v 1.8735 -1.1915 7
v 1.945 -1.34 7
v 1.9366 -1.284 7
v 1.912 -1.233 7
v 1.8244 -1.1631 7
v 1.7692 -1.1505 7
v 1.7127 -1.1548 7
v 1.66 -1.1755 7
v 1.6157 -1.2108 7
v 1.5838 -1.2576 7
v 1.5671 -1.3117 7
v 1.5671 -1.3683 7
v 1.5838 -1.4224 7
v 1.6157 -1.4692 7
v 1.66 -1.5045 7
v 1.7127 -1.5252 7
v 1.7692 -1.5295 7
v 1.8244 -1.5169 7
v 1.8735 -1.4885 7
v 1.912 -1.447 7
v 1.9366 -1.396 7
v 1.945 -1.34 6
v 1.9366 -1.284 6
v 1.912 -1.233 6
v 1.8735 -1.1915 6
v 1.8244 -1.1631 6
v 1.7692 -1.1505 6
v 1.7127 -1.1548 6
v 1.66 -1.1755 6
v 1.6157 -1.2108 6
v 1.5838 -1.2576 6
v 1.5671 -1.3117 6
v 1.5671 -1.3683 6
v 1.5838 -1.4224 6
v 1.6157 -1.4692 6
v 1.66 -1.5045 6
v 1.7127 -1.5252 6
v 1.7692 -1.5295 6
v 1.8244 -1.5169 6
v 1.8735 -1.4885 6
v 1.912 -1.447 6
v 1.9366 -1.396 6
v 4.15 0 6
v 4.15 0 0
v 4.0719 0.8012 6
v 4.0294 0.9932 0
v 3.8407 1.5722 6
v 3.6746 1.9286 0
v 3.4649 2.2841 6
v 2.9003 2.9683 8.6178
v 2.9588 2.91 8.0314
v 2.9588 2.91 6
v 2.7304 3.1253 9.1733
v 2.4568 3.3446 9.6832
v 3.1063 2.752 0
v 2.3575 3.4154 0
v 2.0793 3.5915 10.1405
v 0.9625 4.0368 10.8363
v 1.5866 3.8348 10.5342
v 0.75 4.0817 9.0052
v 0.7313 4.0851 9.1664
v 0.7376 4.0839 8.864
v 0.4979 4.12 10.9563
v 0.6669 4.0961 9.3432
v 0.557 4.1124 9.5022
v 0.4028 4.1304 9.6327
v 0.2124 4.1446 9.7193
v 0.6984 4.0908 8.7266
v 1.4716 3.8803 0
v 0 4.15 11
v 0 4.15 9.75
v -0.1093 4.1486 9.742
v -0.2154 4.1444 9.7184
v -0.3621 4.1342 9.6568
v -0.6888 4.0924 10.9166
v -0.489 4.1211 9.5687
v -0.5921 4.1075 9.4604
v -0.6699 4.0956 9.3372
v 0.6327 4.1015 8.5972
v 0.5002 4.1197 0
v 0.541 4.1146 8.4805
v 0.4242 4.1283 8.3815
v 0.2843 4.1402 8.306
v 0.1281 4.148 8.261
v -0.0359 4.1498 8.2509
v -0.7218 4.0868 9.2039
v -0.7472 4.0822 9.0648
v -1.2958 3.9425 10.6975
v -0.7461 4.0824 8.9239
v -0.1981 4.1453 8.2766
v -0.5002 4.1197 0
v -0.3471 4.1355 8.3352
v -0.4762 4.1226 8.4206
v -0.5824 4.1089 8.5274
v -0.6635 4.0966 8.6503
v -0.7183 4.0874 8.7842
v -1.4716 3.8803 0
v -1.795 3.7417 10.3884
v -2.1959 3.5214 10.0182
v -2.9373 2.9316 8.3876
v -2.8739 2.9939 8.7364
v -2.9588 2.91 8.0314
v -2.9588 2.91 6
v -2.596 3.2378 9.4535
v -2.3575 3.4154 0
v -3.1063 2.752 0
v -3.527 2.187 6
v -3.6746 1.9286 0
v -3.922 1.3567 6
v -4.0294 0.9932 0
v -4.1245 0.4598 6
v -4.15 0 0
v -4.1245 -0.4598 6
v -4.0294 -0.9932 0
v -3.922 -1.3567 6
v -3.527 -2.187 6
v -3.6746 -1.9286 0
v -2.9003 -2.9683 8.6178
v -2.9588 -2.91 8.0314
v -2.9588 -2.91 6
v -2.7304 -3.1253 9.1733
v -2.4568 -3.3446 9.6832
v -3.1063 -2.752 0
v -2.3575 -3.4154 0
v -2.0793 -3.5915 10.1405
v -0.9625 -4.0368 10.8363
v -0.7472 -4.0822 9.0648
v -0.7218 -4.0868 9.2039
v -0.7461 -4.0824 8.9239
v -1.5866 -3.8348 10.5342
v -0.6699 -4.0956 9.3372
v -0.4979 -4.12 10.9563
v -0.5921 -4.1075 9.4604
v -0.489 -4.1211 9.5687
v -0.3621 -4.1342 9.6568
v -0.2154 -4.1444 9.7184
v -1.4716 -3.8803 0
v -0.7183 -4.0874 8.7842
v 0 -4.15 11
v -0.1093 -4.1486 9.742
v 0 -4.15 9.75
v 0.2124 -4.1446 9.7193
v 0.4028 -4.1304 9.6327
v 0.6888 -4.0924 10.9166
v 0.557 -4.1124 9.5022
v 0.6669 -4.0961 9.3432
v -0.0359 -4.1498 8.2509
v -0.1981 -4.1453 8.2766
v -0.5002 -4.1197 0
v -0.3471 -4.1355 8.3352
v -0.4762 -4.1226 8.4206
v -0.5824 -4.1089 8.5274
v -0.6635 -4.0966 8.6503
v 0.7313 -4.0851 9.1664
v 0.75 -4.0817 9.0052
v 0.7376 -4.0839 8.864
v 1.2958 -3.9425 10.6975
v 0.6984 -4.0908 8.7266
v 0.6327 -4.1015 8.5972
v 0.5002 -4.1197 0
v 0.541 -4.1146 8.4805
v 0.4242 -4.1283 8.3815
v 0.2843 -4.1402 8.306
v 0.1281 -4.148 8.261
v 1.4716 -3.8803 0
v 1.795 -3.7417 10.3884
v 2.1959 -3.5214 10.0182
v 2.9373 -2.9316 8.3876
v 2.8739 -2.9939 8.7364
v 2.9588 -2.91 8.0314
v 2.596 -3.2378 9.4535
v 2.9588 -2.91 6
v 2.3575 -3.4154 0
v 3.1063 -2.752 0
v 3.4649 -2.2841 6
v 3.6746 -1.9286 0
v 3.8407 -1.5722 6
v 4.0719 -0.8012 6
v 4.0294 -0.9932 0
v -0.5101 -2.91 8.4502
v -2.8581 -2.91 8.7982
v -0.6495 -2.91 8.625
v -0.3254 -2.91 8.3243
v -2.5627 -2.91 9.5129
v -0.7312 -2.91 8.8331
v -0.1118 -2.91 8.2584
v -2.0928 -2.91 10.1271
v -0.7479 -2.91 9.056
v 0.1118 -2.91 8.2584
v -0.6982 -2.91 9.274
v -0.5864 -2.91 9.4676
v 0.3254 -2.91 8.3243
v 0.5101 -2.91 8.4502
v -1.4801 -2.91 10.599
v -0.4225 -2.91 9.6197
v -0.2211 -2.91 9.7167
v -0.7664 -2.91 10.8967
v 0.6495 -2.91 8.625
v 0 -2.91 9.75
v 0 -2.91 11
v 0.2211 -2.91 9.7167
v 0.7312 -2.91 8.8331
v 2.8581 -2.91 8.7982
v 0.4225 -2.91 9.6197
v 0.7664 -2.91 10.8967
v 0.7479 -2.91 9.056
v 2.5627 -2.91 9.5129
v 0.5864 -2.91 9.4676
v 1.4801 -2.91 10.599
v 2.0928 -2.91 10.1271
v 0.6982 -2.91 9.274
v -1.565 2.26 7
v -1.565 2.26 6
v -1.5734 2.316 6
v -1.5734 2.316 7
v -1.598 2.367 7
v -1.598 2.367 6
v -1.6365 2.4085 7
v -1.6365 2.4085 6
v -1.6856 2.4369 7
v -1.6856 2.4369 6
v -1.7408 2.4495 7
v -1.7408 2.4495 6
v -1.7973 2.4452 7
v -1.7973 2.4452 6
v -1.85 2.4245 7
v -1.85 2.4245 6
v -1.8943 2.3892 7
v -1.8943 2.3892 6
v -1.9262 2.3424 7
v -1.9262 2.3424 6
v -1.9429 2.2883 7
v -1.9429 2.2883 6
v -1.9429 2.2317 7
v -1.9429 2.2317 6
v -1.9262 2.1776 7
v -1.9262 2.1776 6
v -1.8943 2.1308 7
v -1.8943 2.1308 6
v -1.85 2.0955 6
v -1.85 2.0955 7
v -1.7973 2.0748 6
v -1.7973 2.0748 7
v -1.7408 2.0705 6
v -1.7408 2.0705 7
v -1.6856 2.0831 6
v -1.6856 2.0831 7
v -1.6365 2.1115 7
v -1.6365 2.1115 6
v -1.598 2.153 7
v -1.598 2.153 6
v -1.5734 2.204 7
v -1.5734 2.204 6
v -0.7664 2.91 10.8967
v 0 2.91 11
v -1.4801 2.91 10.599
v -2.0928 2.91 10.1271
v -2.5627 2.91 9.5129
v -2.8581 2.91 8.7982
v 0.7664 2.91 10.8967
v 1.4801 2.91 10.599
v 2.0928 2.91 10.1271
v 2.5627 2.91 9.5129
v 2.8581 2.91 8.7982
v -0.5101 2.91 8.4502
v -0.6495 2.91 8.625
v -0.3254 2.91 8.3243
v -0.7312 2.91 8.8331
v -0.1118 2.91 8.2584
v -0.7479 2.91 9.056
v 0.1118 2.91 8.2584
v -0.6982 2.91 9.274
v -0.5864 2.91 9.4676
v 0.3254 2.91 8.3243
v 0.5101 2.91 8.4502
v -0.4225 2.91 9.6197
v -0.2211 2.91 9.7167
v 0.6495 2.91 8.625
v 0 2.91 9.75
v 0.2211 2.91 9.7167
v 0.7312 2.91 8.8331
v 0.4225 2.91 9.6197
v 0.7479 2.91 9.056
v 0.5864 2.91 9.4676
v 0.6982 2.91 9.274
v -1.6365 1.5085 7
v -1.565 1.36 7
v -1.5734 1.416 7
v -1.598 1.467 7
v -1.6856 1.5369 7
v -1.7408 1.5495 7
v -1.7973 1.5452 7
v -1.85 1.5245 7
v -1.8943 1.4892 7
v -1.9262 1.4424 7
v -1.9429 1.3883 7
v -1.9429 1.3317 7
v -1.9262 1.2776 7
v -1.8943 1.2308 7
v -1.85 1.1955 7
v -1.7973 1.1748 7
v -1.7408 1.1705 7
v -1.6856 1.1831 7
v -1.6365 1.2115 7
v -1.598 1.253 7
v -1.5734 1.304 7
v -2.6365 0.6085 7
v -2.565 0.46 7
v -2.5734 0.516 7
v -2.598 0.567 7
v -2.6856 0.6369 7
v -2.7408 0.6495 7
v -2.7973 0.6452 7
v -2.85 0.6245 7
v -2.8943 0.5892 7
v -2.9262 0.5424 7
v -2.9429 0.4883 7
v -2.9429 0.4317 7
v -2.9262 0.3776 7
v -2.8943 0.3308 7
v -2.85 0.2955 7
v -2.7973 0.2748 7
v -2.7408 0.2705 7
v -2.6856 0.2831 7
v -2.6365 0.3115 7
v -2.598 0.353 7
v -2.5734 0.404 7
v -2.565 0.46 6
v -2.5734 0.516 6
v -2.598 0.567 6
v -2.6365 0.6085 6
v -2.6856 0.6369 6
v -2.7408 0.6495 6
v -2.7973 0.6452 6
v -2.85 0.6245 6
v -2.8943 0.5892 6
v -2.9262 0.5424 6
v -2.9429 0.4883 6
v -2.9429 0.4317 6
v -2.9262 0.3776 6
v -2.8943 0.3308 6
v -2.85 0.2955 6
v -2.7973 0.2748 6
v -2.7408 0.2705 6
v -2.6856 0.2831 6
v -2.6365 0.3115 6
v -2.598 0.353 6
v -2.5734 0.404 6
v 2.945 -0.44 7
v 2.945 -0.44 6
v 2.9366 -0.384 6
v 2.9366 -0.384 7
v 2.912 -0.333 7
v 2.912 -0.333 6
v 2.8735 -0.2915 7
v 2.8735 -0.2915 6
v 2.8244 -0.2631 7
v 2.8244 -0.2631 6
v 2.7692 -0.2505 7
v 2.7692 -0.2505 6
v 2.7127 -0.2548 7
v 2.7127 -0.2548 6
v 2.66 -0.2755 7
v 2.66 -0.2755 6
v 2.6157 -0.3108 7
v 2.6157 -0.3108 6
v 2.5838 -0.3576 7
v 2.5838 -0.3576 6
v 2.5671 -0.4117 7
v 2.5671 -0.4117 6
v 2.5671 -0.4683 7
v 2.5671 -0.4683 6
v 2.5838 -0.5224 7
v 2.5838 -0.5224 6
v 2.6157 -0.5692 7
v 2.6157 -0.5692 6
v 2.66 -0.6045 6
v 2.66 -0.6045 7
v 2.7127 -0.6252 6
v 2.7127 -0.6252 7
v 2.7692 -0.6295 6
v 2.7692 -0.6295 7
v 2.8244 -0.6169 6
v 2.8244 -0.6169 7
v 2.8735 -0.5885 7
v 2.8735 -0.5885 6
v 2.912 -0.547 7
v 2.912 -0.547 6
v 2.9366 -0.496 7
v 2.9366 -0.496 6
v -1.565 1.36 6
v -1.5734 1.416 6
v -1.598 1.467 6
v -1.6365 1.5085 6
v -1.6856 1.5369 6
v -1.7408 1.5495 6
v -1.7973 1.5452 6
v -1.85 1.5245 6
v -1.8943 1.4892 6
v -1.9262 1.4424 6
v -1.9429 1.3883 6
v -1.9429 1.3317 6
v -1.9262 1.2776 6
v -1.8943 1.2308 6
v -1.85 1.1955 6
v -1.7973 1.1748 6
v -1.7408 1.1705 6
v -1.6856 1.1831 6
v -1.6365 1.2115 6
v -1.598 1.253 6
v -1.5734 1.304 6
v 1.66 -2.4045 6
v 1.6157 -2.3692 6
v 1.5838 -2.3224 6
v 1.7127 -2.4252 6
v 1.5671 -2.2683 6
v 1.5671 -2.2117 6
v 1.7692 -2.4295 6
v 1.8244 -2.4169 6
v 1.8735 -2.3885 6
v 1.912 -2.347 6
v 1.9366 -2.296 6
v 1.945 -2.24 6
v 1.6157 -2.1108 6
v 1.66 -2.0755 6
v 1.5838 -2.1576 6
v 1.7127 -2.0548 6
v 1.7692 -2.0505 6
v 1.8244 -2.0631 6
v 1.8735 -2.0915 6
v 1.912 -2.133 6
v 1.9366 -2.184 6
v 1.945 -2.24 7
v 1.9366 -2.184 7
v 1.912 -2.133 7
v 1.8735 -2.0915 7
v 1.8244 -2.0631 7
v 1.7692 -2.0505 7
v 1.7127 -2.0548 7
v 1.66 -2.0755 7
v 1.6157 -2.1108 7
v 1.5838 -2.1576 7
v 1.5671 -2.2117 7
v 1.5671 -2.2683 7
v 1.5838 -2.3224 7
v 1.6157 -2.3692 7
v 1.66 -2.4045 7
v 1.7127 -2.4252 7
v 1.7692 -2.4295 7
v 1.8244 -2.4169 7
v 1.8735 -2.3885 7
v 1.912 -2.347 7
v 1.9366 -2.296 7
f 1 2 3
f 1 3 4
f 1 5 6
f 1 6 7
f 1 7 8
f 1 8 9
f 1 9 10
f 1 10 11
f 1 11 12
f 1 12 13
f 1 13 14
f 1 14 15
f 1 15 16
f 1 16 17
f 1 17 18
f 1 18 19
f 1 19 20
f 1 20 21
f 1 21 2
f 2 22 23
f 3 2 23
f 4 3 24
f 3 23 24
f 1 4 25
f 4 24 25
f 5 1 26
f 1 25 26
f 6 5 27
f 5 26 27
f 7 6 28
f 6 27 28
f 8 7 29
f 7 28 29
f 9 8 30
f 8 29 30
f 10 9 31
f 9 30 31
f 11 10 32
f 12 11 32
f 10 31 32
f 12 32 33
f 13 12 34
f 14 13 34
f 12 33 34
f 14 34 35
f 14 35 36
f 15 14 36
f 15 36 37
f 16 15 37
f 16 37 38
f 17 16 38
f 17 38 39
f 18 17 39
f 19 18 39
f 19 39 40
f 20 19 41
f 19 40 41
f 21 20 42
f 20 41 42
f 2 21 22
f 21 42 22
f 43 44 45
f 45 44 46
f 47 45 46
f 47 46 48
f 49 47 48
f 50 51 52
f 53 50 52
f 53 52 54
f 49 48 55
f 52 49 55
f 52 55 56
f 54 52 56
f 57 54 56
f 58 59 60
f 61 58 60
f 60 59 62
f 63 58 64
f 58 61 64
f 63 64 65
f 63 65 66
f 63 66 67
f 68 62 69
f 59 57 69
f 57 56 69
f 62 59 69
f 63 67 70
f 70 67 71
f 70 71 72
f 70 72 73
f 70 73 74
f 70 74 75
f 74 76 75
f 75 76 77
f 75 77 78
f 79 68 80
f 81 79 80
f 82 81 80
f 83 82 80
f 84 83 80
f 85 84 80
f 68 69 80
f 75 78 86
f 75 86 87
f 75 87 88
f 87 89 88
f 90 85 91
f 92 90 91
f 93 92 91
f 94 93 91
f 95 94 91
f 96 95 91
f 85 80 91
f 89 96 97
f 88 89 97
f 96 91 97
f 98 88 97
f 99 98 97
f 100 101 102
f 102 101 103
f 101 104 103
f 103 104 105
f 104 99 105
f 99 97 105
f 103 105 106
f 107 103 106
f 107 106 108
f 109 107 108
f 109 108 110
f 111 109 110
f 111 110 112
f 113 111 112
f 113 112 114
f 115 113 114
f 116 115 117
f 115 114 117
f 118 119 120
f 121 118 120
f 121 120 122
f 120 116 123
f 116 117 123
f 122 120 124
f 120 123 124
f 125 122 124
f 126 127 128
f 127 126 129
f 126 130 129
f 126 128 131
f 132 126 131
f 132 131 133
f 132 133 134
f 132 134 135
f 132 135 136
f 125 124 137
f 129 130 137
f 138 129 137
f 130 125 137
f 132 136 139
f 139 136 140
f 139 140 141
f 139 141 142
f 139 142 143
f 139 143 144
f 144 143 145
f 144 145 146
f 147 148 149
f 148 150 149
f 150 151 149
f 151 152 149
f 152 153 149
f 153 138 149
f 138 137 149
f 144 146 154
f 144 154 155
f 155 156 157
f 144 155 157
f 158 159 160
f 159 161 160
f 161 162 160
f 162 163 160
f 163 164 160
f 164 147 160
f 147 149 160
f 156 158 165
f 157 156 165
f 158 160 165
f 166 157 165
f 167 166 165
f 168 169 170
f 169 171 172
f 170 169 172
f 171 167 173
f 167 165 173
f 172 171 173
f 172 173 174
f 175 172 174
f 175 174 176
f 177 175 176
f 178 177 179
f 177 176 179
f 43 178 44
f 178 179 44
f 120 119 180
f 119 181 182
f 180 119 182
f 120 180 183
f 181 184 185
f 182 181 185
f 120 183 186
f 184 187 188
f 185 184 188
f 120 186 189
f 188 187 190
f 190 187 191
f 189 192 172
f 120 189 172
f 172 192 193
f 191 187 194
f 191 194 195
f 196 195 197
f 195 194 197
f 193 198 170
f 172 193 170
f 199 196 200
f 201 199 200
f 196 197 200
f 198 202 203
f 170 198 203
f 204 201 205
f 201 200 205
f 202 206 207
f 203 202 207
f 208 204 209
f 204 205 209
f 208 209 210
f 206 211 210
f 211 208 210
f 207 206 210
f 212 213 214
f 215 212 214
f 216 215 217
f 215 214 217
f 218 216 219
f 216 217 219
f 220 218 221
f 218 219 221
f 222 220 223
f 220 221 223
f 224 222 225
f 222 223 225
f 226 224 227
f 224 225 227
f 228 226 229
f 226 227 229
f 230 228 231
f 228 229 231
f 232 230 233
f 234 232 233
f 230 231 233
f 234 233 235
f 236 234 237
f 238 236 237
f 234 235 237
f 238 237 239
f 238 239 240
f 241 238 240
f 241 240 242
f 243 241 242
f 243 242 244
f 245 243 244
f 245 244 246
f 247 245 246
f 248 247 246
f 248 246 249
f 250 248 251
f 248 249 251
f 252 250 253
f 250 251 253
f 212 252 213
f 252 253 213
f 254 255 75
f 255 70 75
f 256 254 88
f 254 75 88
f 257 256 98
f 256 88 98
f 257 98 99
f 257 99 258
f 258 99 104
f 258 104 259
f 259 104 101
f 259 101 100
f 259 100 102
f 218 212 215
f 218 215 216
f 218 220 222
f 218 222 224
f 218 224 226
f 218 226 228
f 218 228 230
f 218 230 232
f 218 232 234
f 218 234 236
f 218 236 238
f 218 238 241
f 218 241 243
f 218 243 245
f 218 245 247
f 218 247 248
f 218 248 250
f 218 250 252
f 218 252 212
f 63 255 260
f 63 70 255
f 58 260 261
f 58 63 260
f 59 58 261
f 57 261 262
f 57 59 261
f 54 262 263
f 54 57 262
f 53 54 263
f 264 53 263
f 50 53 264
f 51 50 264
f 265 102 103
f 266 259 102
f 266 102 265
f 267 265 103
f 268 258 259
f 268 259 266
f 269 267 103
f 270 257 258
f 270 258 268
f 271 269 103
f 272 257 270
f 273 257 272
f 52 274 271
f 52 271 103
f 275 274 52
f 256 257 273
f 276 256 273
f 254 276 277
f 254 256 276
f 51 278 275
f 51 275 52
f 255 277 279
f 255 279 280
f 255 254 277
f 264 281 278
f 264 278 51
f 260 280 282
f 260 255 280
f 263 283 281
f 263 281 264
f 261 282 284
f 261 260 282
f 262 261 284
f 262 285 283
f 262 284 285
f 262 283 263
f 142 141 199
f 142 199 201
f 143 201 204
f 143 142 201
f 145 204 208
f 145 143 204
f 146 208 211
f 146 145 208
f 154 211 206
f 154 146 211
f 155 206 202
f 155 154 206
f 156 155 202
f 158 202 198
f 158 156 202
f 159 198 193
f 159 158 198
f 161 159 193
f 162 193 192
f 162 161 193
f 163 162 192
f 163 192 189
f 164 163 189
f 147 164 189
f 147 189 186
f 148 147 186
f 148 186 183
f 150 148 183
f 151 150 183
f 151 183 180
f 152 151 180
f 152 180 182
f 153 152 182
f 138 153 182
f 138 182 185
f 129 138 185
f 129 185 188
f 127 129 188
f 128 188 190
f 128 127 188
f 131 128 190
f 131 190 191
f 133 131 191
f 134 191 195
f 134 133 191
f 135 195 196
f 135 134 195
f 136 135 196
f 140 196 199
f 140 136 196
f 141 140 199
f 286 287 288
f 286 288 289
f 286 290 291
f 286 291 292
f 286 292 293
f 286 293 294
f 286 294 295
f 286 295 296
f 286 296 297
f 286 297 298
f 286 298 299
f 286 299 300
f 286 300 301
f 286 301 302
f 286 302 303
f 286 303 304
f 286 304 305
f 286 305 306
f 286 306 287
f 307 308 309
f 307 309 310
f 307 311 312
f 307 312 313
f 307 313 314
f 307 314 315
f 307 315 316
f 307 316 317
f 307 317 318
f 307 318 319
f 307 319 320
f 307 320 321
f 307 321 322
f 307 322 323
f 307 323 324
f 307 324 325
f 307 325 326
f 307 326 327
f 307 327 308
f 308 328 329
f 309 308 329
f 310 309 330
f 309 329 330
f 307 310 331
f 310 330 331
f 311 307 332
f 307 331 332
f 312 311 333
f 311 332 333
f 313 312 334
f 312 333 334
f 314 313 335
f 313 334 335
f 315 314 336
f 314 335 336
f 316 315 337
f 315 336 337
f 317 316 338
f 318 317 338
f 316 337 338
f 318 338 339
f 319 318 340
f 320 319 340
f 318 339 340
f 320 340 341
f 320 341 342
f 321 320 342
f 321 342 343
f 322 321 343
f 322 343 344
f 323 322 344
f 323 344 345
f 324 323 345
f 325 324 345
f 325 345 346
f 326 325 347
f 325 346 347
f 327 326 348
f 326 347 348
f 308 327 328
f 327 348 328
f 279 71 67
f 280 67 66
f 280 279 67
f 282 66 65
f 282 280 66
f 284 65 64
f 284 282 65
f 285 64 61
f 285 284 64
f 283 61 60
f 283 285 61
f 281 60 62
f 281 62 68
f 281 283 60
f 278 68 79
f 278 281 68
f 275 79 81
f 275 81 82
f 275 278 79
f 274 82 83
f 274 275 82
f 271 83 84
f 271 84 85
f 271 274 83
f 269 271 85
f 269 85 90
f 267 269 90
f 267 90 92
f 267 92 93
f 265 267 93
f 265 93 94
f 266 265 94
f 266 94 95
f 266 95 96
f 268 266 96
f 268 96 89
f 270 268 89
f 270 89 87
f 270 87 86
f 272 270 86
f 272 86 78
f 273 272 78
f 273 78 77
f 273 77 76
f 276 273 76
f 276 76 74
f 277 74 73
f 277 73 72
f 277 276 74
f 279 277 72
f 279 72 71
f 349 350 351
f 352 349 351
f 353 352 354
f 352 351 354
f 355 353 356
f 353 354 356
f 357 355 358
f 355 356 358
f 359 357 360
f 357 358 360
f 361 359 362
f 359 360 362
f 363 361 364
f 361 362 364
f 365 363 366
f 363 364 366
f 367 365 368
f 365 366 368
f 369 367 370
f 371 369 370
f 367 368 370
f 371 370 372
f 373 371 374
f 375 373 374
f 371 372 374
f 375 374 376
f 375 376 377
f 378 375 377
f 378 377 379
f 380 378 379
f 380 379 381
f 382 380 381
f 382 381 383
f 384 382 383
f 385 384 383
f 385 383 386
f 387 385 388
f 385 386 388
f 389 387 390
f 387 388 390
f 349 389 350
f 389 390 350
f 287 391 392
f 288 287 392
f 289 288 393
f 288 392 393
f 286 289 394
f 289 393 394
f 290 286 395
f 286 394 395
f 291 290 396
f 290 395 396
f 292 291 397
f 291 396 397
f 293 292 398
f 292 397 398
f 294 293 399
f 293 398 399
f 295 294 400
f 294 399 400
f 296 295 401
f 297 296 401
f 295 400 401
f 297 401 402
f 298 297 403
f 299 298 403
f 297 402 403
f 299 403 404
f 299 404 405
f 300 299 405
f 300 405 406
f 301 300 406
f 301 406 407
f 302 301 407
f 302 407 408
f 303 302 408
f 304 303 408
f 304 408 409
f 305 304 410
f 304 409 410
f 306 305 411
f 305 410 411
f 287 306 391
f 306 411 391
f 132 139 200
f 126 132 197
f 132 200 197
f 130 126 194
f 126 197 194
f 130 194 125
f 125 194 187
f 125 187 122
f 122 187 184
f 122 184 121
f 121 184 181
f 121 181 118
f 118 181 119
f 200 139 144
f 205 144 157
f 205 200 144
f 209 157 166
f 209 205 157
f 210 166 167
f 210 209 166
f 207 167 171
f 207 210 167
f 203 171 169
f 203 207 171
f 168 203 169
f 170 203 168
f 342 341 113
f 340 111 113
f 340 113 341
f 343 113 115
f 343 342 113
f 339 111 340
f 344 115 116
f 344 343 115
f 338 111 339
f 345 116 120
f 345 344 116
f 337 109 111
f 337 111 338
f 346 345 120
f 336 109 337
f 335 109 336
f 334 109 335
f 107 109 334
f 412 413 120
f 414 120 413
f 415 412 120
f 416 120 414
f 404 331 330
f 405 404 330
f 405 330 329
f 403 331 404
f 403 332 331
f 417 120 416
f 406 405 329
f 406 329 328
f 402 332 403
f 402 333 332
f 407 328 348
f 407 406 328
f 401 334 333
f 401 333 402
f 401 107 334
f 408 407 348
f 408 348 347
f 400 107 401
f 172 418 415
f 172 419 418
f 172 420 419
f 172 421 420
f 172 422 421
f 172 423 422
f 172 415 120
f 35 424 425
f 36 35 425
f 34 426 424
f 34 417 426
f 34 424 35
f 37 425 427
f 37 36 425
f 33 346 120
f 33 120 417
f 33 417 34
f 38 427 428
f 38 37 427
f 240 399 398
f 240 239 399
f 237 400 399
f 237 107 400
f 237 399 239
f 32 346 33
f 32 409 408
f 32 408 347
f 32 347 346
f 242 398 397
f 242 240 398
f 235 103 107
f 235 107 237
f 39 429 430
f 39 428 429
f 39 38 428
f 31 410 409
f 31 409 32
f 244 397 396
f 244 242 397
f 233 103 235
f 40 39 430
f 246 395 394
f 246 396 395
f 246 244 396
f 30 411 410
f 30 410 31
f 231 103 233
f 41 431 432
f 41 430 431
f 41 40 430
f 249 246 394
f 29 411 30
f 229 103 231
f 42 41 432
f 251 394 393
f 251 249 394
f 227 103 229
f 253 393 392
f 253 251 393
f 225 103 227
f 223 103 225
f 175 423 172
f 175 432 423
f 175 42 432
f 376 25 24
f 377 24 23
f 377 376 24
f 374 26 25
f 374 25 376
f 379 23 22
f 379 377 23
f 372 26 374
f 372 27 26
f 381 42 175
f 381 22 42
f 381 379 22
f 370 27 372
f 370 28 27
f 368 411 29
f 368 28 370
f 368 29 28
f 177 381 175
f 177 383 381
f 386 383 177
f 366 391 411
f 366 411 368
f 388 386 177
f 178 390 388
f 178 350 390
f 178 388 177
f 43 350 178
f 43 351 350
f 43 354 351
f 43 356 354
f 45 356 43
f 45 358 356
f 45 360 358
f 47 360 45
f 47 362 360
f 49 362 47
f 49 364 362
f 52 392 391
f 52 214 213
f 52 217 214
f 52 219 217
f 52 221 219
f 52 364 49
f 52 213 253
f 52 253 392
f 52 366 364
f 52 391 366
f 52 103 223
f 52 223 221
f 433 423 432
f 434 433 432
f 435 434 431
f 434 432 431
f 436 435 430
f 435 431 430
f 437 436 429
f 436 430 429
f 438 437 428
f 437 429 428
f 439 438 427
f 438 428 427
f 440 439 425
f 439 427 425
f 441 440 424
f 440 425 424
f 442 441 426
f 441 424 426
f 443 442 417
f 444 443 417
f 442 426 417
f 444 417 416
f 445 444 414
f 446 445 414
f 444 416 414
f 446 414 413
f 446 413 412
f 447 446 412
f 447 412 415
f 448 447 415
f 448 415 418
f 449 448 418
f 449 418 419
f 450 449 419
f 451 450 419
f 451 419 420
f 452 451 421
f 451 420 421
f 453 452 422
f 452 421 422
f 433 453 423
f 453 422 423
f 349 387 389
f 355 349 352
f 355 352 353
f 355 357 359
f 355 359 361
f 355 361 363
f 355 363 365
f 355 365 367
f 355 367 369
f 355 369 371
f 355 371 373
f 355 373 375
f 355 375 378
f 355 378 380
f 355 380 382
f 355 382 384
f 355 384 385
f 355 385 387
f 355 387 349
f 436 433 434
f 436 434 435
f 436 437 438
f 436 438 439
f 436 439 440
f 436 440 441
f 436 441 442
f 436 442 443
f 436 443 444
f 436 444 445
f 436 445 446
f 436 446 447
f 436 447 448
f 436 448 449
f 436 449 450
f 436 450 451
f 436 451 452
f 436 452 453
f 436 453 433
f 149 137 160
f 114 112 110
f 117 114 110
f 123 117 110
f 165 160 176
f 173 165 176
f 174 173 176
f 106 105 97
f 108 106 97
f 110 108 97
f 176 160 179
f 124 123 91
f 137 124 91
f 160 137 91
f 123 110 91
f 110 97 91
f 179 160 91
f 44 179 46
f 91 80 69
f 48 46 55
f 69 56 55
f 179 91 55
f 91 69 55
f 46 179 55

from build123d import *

# Parameters (mm, degrees)
SKETCH1_R               = 4.15
BOSS_EXTRUDE1_DEPTH     = 11
SKETCH2_W               = 8.37511106
SKETCH2_H               = 5.82
CUT_EXTRUDE1_DEPTH      = 5
CUT_EXTRUDE2_DEPTH      = 13.467758419
CUT_EXTRUDE3_DEPTH      = 13.467758574
CUT_EXTRUDE3_DEPTH_BACK = 13.467758574
SKETCH4_R               = 0.75
SKETCH5_R               = 0.19
BOSS_EXTRUDE2_DEPTH     = 1


with BuildPart() as part:
    # Sketch1 → Boss-Extrude1 (new body)
    with BuildSketch(Plane.XY):
        Circle(SKETCH1_R)
    extrude(amount=BOSS_EXTRUDE1_DEPTH)

    # Sketch2 → Cut-Extrude1 (cut)
    with BuildSketch(Plane.XY.offset(11)):
        Rectangle(SKETCH2_W, SKETCH2_H)
    extrude(amount=-CUT_EXTRUDE1_DEPTH, mode=Mode.SUBTRACT)

    # Sketch3 → Cut-Extrude2 (cut, symmetric)
    with BuildSketch(Plane(origin=(0, 0, 0), x_dir=(1, 0, 0), z_dir=(0, 1, 0))):
        with BuildLine():
            Line((-2.958783534, -8.031414478), (-2.958783534, -11))
            Line((-2.958783534, -11), (0, -11))
            ThreePointArc((0, -11), (-2.092768611, -10.127058771), (-2.958783534, -8.031414478))
        make_face()
    cut_extrude2 = extrude(amount=CUT_EXTRUDE2_DEPTH, both=True, mode=Mode.SUBTRACT)

    # Mirror1: Cut-Extrude2 across plane
    add(cut_extrude2.mirror(Plane(origin=(0, 0, 0), x_dir=(0, 0, 1), z_dir=(1, 0, 0))), mode=Mode.SUBTRACT)

    # Sketch4 → Cut-Extrude3 (cut, two sides: drawn at the far end of the back side and taken through both)
    with BuildSketch(Plane(origin=(0, 0, 0), x_dir=(1, 0, 0), z_dir=(0, 1, 0)).offset(-CUT_EXTRUDE3_DEPTH_BACK)):
        with Locations(Location((0, -9, 0), (0, 0, 270))):
            Circle(SKETCH4_R)
    extrude(amount=CUT_EXTRUDE3_DEPTH + CUT_EXTRUDE3_DEPTH_BACK, mode=Mode.SUBTRACT)

    # Sketch5 → Boss-Extrude2 (add)
    with BuildSketch(Plane.XY.offset(6)):
        with Locations((-1.755, 2.26)):
            Circle(SKETCH5_R)
        with Locations((-1.755, 1.36)):
            Circle(SKETCH5_R)
        with Locations((1.755, -1.34)):
            Circle(SKETCH5_R)
        with Locations((1.755, -2.24)):
            Circle(SKETCH5_R)
        with Locations((-2.755, 0.46)):
            Circle(SKETCH5_R)
        with Locations((2.755, -0.44)):
            Circle(SKETCH5_R)
    extrude(amount=BOSS_EXTRUDE2_DEPTH)


solid = part.part
